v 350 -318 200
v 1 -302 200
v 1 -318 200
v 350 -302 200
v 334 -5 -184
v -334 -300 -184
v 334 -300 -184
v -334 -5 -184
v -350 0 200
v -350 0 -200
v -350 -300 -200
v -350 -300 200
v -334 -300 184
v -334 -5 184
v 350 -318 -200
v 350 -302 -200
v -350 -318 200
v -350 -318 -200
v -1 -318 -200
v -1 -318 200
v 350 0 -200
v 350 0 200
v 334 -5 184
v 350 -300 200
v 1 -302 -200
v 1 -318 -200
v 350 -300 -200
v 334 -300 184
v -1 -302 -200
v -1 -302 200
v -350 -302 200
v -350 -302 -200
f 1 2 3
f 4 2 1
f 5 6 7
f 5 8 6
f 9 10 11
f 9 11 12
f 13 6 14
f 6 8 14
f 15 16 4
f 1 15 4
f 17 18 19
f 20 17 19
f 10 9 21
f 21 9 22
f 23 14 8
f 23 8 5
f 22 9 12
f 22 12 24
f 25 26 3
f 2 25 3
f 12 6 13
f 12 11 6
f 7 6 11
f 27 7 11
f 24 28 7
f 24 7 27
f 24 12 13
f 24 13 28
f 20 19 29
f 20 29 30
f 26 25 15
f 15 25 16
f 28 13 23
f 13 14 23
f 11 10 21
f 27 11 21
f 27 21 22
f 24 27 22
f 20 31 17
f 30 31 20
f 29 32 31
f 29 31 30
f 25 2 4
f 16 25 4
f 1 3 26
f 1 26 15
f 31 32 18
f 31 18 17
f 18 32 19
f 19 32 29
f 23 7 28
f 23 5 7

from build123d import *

# Parameters (mm, degrees)
F0_W     = 700
F0_H     = 400
F1_DEPTH = 300
F2_T     = -16
F3_DEPTH = 11
F5_W     = 700
F5_H     = 400
F6_DEPTH = 16
F7_W     = 2
F7_H     = 400
F8_DEPTH = 16


with BuildPart() as f1:
    # F0 (on Front) → F1 (new body)
    with BuildSketch(Plane.XZ):
        Rectangle(F0_W, F0_H)
    extrude(amount=F1_DEPTH)

    # F2
    f2_openings = [f1.faces().sort_by_distance(p)[0] for p in [
        (0, -300, 0),
    ]]
    offset(amount=F2_T, openings=f2_openings)

    # F3 (cut): a face of the model
    f3_faces = [f1.faces().sort_by_distance(p)[0] for p in [
        (0, -16, 0),
    ]]
    extrude(f3_faces, amount=-F3_DEPTH, mode=Mode.SUBTRACT)


with BuildPart() as f6:
    # F5 (on offset) → F6 (new body)
    with BuildSketch(Plane.XZ.offset(302)):
        Rectangle(F5_W, F5_H)
    extrude(amount=F6_DEPTH)

    # F7 (on face) → F8 (cut, through all)
    with BuildSketch(Plane.XZ.offset(318)):
        Rectangle(F7_W, F7_H)
    extrude(amount=-F8_DEPTH, mode=Mode.SUBTRACT)


solid = Compound([f1.part, f6.part])
